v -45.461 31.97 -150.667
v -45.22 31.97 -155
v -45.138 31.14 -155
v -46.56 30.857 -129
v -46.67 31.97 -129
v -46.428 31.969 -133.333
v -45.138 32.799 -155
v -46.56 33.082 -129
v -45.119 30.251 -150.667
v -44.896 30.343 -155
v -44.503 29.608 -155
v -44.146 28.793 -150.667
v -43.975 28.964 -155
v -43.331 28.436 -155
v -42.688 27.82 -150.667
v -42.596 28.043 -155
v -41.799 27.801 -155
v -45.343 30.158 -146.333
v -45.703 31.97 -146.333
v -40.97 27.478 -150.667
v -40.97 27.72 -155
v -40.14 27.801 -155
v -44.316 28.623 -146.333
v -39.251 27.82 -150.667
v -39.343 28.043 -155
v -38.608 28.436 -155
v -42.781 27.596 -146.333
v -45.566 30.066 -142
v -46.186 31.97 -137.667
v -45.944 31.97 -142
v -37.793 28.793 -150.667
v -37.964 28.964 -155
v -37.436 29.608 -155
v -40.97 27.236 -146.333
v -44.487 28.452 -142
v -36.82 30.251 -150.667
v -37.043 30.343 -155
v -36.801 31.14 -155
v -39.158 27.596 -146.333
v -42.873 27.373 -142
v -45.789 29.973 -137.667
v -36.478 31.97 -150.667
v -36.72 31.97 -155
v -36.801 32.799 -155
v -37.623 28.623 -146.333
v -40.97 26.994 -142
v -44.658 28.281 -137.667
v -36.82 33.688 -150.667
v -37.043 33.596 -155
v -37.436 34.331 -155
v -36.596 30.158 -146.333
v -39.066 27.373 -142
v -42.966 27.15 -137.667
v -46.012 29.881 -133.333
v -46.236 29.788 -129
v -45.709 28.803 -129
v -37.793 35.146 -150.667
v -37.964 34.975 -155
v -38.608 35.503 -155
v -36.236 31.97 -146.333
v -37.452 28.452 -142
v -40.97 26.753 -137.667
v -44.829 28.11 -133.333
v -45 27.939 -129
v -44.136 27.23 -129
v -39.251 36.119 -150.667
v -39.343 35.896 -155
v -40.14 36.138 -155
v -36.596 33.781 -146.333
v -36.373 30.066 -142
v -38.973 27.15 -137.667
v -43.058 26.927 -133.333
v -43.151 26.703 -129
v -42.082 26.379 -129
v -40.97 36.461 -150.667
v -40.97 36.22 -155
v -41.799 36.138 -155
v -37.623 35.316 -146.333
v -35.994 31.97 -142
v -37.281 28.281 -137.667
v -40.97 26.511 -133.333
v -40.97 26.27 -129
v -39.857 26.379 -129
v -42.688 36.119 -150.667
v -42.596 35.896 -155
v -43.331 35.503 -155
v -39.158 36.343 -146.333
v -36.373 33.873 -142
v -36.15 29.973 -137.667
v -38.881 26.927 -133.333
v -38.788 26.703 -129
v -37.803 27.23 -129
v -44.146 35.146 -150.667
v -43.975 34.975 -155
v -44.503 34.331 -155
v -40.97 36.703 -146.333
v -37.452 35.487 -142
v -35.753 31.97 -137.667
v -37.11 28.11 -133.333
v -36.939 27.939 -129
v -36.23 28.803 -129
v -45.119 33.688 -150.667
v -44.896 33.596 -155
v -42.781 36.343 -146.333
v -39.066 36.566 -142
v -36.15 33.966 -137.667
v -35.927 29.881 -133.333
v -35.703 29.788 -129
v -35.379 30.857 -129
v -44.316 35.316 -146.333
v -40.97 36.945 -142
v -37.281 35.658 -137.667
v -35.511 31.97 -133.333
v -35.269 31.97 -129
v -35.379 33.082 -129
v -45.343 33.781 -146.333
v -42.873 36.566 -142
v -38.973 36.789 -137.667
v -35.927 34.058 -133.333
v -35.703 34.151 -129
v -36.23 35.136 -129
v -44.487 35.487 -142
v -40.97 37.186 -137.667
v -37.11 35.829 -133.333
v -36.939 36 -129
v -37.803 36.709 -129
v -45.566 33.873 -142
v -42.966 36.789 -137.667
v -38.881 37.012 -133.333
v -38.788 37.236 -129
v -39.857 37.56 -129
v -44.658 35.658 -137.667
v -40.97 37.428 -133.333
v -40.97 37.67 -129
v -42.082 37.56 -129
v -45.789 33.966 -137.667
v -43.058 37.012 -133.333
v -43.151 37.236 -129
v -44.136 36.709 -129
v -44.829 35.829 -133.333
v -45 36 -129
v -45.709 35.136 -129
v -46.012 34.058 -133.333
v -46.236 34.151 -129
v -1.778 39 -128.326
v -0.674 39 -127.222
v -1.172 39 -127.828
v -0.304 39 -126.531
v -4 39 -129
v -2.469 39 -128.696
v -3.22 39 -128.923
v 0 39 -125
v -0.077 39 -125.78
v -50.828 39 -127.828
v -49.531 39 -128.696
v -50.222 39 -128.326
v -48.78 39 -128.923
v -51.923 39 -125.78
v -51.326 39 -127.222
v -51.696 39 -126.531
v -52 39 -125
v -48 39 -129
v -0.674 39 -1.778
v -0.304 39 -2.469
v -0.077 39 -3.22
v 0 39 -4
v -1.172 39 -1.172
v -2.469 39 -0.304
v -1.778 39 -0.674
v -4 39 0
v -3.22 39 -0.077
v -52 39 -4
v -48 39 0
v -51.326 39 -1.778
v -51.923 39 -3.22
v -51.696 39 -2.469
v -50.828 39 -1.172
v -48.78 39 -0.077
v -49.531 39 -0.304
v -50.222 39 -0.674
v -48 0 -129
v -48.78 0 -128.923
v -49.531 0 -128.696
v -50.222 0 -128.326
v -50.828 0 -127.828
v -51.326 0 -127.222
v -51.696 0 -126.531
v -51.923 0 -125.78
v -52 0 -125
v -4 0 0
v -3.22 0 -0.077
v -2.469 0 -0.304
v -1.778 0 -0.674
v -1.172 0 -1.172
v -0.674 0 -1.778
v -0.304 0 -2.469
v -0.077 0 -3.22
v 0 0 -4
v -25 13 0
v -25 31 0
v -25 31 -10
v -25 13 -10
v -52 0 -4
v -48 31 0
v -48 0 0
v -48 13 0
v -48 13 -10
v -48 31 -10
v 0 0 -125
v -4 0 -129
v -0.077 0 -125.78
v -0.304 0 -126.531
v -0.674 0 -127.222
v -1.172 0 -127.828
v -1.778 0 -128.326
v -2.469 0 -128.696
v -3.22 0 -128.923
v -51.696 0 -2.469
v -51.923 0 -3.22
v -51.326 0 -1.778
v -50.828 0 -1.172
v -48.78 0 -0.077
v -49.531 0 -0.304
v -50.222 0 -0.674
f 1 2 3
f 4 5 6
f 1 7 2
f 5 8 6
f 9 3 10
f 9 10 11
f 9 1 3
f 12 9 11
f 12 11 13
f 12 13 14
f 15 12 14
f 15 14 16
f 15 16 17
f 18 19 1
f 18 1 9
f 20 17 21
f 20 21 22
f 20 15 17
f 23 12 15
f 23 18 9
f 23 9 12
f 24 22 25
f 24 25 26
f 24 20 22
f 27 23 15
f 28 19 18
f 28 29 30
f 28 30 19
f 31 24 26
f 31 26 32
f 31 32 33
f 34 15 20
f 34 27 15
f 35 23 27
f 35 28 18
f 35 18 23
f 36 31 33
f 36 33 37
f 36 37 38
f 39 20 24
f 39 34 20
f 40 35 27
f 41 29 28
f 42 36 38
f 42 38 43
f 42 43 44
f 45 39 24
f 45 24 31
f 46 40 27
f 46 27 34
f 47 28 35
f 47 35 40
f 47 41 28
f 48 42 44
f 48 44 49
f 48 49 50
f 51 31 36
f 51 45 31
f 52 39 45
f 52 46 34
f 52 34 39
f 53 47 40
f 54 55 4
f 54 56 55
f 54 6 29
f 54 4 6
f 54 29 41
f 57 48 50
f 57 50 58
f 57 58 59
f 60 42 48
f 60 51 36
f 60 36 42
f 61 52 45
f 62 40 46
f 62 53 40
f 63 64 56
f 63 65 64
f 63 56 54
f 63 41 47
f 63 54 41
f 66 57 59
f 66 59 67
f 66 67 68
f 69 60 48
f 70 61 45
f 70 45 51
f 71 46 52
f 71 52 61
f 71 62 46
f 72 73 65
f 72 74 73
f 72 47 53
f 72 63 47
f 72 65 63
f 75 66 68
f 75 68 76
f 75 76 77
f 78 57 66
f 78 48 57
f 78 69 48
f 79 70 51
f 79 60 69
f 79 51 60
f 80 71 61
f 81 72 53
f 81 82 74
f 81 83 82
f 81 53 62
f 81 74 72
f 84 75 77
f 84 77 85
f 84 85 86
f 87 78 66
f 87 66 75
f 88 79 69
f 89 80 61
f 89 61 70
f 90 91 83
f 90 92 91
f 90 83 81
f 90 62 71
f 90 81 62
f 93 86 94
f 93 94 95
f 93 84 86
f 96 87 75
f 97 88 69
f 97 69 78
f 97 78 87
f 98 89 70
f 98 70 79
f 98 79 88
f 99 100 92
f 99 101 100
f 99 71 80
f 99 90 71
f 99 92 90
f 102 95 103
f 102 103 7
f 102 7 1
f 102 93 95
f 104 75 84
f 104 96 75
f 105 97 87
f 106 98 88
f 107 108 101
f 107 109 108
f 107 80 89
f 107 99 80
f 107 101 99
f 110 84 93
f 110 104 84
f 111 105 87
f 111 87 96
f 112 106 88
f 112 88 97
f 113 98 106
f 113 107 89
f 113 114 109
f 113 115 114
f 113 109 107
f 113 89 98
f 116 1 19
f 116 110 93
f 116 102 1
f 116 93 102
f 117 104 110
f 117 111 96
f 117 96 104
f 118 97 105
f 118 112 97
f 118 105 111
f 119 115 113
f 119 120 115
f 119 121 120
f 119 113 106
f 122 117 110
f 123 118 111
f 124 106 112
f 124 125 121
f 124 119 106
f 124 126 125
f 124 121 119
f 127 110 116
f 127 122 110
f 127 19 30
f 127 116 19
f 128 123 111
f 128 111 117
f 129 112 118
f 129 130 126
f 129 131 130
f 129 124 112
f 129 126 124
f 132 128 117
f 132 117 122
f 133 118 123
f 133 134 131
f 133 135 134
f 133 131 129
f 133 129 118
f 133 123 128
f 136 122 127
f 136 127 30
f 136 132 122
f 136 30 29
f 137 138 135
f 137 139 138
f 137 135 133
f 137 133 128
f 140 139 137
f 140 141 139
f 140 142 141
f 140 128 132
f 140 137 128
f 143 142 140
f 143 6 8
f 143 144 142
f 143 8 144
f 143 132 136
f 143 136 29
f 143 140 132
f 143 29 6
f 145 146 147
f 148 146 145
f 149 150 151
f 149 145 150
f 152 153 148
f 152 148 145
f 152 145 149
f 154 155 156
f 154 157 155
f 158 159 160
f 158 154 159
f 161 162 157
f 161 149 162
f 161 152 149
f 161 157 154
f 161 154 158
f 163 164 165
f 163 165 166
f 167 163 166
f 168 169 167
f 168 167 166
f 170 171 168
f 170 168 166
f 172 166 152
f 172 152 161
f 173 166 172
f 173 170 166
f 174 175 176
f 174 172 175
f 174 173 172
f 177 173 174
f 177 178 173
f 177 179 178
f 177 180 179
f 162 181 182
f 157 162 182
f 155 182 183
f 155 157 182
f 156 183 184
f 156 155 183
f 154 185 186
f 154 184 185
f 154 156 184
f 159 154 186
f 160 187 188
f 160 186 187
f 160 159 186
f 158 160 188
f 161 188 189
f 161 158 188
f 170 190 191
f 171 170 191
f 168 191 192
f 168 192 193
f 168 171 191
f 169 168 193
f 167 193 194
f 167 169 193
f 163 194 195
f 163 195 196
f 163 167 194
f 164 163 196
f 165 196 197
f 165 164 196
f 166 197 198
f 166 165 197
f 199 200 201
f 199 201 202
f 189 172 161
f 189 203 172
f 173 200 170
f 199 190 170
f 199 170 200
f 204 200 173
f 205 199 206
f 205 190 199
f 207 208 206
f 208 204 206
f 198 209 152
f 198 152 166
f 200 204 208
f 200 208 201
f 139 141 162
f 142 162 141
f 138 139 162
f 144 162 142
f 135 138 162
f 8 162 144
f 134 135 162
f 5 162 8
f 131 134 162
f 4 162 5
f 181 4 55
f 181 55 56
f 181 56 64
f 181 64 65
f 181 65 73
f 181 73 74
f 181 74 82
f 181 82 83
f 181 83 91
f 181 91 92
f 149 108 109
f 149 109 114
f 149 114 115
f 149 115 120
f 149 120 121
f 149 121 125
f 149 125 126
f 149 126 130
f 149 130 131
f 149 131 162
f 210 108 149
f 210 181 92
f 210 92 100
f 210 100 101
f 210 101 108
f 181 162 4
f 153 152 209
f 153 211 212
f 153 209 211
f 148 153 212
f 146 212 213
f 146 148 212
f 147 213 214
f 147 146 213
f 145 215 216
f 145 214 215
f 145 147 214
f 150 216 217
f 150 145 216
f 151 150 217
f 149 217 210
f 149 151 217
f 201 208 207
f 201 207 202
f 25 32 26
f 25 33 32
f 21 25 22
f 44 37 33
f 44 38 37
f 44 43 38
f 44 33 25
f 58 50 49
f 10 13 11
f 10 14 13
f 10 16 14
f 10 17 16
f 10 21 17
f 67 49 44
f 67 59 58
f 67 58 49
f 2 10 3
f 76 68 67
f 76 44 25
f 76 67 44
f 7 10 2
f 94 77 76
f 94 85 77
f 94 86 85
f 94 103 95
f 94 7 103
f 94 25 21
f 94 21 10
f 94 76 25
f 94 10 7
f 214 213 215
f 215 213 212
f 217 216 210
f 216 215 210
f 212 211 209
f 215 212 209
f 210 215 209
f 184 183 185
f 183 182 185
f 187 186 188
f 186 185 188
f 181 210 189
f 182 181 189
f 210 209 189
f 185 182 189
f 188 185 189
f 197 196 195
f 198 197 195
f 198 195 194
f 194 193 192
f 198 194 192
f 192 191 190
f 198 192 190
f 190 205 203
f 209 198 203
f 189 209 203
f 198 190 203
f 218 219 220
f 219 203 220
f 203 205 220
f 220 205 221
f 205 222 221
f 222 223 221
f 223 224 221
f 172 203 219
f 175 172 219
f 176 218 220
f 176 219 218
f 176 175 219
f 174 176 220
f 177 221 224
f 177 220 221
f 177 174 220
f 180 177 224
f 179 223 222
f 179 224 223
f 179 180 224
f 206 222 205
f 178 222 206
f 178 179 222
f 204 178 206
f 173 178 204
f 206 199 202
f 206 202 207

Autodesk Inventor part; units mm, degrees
ref_plane "YZ Plane" through (0, 0, 0) normal (1, 0, 0) x (0, 1, 0)
ref_plane "XZ Plane" through (0, 0, 0) normal (0, 1, 0) x (-1, 0, 0)
sketch "Sketch1" plane through (0, 0, 0) normal (0, 1, 0) x (-1, 0, 0)
  line L0 (0, 0) -> (52, 0)
  line L1 (52, 0) -> (52, -129)
  line L2 (52, -129) -> (0, -129)
  line L3 (0, -129) -> (0, 0)
  dimension "d0" = 52
  dimension "d1" = 129
extrude "Extrusion1" add sketch "Sketch1" along normal blind 39
fillet "Fillet1" radius 4 4 edges at (0, 19.5, 0) (0, 19.5, -129) (-52, 19.5, 0) (-52, 19.5, -129)
sketch "Sketch2" plane through (-48, 0, 0) normal (0, 0, 1) x (1, 0, 0)
  line L0 (44, 39) -> (0, 39) projected
  line L1 (0, 39) -> (0, 31)
  line L2 (0, 39) -> (0, 0) projected
  line L3 (0, 31) -> (23, 31)
  line L4 (23, 31) -> (23, 13)
  line L5 (23, 13) -> (0, 13)
  line L6 (0, 13) -> (0, 31)
  point P0 (48, 0)
  dimension "d5" = 8
  dimension "d6" = 23
  dimension "d7" = 18
extrude "Extrusion2" cut sketch "Sketch2" against normal blind 10
sketch "Sketch3" plane through (-4, 0, -129) normal (0, 0, -1) x (-1, 0, 0)
  line L0 (0, 39) -> (44, 39) projected
  line L1 (44, 39) -> (44, 36)
  line L2 (44, 39) -> (44, 0) projected
  line L3 (44, 36) -> (41, 36)
  line L4 (41, 36) -> (36.9695, 31.9695)
  line L5 (41, 36) -> (46.7, 36) construction
  circle A0 centre (36.9695, 31.9695) radius 5.7
  point P0 (-4, 0)
  dimension "d10" = 3
  dimension "d11" = 3
  dimension "d12" = 5.7
  dimension "d13" = 135
ref_plane "Work Plane1" through (-4, 0, -155) normal (0, 0, -1) x (-1, 0, 0)
sketch "Sketch4" plane through (-4, 0, -155) normal (0, 0, -1) x (-1, 0, 0)
  line L0 (0, 39) -> (44, 39) projected
  line L1 (44, 39) -> (44, 36)
  line L2 (44, 39) -> (44, 0) projected
  line L3 (44, 36) -> (41, 36)
  line L4 (41, 36) -> (36.9695, 31.9695)
  line L5 (41, 36) -> (46.7, 36) construction
  circle A0 centre (36.9695, 31.9695) radius 4.25
  point P0 (-4, 0)
  dimension "d15" = 3
  dimension "d16" = 3
  dimension "d17" = 5.7
  dimension "d18" = 135
  dimension "d19" = 8.5
loft "Loft1" add profiles "Sketch3", "Sketch4"
properties part number "NucPower"
